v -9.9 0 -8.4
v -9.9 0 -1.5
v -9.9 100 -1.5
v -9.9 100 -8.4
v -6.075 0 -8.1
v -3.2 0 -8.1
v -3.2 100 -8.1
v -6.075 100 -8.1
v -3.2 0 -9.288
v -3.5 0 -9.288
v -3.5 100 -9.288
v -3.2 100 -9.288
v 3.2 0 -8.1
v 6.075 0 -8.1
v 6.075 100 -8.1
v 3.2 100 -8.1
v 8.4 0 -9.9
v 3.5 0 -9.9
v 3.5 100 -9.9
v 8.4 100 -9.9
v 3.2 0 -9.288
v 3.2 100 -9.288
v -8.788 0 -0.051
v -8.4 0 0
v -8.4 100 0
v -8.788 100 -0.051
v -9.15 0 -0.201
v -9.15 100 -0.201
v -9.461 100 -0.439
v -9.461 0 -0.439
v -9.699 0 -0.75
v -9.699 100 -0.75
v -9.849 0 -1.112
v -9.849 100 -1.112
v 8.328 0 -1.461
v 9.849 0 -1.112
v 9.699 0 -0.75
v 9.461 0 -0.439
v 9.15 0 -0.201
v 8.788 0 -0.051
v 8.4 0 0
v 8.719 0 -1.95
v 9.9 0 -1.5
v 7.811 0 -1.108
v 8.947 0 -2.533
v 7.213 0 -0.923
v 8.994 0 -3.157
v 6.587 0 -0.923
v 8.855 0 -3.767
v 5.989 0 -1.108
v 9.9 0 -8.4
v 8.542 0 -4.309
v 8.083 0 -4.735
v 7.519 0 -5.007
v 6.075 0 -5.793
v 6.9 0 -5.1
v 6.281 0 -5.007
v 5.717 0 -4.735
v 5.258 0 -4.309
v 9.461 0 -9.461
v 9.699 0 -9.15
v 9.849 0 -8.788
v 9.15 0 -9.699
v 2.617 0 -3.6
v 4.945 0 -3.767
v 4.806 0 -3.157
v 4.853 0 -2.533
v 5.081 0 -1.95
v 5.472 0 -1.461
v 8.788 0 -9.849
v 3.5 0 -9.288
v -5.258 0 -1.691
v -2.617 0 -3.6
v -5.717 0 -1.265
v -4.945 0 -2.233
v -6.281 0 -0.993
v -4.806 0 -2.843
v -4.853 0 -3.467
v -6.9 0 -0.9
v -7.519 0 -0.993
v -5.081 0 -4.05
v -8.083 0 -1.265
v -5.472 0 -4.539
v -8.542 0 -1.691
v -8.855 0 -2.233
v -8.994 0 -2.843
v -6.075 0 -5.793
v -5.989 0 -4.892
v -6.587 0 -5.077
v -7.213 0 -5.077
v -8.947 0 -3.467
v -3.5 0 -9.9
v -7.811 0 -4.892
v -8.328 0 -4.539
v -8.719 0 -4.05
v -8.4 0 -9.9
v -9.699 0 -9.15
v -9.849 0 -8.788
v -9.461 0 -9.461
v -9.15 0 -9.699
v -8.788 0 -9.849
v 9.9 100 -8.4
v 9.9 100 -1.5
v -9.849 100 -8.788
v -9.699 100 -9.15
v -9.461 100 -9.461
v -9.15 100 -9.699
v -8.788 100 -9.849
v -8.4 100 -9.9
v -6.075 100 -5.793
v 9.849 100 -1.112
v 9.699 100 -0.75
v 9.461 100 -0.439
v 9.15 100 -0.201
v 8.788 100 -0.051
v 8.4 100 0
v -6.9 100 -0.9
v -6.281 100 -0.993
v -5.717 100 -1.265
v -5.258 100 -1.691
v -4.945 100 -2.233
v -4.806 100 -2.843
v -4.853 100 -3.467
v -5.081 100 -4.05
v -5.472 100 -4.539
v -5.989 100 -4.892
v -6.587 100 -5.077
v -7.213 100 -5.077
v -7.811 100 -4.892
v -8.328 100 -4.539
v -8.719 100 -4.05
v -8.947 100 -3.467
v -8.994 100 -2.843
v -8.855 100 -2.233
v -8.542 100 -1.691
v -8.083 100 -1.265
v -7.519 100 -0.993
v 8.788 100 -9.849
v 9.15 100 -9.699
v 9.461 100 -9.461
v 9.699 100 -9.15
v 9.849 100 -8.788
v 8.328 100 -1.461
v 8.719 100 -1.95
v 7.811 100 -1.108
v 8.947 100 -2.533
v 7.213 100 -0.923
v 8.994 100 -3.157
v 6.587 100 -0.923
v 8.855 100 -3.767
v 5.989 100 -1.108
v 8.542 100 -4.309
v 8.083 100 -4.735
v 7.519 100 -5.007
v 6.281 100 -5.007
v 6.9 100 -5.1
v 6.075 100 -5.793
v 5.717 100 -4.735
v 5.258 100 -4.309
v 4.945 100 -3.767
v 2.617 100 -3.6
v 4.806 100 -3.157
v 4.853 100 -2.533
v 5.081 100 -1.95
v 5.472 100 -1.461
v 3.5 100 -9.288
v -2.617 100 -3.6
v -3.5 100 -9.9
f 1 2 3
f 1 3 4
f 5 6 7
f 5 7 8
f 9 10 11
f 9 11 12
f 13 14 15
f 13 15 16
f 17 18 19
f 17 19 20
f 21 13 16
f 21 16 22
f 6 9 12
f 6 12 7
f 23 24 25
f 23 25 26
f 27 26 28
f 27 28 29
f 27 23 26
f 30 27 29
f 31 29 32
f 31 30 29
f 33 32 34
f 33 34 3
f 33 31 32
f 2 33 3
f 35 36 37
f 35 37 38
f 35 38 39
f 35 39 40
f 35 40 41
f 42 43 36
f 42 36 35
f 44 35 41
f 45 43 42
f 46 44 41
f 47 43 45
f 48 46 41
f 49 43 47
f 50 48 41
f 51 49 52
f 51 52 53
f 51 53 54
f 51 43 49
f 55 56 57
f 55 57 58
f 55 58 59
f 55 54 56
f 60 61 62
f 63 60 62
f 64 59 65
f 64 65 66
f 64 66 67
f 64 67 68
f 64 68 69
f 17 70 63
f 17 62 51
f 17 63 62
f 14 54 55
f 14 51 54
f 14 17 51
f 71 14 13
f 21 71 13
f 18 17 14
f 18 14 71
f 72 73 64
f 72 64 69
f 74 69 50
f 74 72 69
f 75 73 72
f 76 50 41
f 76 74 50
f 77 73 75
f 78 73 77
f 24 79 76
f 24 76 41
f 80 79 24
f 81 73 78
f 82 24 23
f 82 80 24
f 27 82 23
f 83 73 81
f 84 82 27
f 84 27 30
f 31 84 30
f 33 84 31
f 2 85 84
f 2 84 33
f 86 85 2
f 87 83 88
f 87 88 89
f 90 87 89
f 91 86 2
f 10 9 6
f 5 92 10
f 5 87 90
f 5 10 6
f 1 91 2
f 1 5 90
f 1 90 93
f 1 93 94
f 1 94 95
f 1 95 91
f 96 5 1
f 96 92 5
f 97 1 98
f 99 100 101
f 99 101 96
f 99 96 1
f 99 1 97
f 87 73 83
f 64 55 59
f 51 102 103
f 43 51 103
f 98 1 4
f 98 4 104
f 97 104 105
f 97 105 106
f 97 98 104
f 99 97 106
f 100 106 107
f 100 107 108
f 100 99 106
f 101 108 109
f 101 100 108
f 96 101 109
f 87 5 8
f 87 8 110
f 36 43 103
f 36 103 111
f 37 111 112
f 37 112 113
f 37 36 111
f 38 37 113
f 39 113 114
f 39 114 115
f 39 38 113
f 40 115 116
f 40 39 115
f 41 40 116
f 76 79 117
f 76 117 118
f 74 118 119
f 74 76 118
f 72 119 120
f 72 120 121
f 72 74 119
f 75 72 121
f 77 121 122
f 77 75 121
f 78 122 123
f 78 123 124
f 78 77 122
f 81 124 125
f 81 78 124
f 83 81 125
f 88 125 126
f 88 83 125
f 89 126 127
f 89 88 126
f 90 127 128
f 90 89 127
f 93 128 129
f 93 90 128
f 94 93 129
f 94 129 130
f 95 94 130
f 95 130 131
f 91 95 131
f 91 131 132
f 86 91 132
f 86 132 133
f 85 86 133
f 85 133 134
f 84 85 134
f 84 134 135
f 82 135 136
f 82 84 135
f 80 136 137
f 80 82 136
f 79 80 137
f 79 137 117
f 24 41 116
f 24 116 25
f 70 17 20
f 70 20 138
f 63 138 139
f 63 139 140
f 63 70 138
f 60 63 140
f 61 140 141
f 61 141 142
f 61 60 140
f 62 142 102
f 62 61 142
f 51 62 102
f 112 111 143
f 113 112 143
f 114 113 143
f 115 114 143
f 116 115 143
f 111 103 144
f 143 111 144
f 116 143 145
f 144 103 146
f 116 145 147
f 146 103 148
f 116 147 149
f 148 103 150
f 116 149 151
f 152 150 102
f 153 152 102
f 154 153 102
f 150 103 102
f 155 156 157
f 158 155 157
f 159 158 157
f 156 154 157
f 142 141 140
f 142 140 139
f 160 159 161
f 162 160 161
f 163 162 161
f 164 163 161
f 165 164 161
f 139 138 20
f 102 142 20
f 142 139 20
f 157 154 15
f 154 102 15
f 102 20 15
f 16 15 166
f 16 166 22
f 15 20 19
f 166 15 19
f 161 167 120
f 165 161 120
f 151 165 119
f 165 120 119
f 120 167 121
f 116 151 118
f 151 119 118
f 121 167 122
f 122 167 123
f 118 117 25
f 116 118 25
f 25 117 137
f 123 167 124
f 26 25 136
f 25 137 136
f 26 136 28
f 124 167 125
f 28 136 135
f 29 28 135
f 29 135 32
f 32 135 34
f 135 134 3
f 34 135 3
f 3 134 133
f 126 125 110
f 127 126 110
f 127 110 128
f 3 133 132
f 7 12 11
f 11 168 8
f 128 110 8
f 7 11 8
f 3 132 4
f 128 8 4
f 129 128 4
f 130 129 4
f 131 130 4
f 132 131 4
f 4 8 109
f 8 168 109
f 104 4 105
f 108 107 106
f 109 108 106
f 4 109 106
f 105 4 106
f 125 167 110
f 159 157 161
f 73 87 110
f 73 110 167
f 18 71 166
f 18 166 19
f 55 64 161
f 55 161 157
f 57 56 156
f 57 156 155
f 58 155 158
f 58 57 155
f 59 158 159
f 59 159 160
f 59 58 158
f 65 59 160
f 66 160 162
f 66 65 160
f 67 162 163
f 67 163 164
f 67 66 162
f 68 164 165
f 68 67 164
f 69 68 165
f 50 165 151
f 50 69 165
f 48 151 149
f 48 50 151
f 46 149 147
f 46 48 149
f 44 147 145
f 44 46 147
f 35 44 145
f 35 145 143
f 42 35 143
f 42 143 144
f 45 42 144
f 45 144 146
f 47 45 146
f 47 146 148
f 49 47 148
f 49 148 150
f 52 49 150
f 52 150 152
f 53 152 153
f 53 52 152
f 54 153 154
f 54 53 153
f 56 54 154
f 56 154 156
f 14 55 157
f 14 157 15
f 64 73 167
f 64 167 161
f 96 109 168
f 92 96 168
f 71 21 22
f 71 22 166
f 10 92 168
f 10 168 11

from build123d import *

# Parameters (mm, degrees)
SKETCH_1_R      = 2.1
EXTRUDE_1_DEPTH = 100


with BuildPart() as part:
    # 草图1 → 凸台-拉伸1 (new body)
    with BuildSketch(Plane(origin=(0, 0, 0), x_dir=(1, 0, 0), z_dir=(0, 1, 0))):
        with BuildLine():
            Line((8.4, 0), (-8.4, 0))
            ThreePointArc((-8.4, 0), (-9.460660172, 0.439339828), (-9.9, 1.5))
            Line((-9.9, 1.5), (-9.9, 8.4))
            ThreePointArc((-9.9, 8.4), (-9.460660172, 9.460660172), (-8.4, 9.9))
            Line((-8.4, 9.9), (-3.5, 9.9))
            Line((-3.5, 9.9), (-3.5, 9.288498403))
            Line((-3.5, 9.288498403), (-3.2, 9.288498403))
            Line((-3.2, 9.288498403), (-3.2, 8.1))
            Line((-3.2, 8.1), (-6.074788311, 8.1))
            Line((-6.074788311, 8.1), (-6.074788311, 5.792971246))
            Line((-6.074788311, 5.792971246), (-2.616641346, 3.6))
            Line((-2.616641346, 3.6), (2.616641346, 3.6))
            Line((2.616641346, 3.6), (6.074788311, 5.792971246))
            Line((6.074788311, 5.792971246), (6.074788311, 8.1))
            Line((6.074788311, 8.1), (3.2, 8.1))
            Line((3.2, 8.1), (3.2, 9.288498403))
            Line((3.2, 9.288498403), (3.5, 9.288498403))
            Line((3.5, 9.288498403), (3.5, 9.9))
            Line((3.5, 9.9), (8.4, 9.9))
            ThreePointArc((8.4, 9.9), (9.460660172, 9.460660172), (9.9, 8.4))
            Line((9.9, 8.4), (9.9, 1.5))
            ThreePointArc((9.9, 1.5), (9.460660172, 0.439339828), (8.4, 0))
        make_face()
        with Locations(Location((-6.9, 3, 0), (0, 0, 270))):
            Circle(SKETCH_1_R, mode=Mode.SUBTRACT)
        with Locations(Location((6.9, 3, 0), (0, 0, 90))):
            Circle(SKETCH_1_R, mode=Mode.SUBTRACT)
    extrude(amount=EXTRUDE_1_DEPTH)


solid = part.part
